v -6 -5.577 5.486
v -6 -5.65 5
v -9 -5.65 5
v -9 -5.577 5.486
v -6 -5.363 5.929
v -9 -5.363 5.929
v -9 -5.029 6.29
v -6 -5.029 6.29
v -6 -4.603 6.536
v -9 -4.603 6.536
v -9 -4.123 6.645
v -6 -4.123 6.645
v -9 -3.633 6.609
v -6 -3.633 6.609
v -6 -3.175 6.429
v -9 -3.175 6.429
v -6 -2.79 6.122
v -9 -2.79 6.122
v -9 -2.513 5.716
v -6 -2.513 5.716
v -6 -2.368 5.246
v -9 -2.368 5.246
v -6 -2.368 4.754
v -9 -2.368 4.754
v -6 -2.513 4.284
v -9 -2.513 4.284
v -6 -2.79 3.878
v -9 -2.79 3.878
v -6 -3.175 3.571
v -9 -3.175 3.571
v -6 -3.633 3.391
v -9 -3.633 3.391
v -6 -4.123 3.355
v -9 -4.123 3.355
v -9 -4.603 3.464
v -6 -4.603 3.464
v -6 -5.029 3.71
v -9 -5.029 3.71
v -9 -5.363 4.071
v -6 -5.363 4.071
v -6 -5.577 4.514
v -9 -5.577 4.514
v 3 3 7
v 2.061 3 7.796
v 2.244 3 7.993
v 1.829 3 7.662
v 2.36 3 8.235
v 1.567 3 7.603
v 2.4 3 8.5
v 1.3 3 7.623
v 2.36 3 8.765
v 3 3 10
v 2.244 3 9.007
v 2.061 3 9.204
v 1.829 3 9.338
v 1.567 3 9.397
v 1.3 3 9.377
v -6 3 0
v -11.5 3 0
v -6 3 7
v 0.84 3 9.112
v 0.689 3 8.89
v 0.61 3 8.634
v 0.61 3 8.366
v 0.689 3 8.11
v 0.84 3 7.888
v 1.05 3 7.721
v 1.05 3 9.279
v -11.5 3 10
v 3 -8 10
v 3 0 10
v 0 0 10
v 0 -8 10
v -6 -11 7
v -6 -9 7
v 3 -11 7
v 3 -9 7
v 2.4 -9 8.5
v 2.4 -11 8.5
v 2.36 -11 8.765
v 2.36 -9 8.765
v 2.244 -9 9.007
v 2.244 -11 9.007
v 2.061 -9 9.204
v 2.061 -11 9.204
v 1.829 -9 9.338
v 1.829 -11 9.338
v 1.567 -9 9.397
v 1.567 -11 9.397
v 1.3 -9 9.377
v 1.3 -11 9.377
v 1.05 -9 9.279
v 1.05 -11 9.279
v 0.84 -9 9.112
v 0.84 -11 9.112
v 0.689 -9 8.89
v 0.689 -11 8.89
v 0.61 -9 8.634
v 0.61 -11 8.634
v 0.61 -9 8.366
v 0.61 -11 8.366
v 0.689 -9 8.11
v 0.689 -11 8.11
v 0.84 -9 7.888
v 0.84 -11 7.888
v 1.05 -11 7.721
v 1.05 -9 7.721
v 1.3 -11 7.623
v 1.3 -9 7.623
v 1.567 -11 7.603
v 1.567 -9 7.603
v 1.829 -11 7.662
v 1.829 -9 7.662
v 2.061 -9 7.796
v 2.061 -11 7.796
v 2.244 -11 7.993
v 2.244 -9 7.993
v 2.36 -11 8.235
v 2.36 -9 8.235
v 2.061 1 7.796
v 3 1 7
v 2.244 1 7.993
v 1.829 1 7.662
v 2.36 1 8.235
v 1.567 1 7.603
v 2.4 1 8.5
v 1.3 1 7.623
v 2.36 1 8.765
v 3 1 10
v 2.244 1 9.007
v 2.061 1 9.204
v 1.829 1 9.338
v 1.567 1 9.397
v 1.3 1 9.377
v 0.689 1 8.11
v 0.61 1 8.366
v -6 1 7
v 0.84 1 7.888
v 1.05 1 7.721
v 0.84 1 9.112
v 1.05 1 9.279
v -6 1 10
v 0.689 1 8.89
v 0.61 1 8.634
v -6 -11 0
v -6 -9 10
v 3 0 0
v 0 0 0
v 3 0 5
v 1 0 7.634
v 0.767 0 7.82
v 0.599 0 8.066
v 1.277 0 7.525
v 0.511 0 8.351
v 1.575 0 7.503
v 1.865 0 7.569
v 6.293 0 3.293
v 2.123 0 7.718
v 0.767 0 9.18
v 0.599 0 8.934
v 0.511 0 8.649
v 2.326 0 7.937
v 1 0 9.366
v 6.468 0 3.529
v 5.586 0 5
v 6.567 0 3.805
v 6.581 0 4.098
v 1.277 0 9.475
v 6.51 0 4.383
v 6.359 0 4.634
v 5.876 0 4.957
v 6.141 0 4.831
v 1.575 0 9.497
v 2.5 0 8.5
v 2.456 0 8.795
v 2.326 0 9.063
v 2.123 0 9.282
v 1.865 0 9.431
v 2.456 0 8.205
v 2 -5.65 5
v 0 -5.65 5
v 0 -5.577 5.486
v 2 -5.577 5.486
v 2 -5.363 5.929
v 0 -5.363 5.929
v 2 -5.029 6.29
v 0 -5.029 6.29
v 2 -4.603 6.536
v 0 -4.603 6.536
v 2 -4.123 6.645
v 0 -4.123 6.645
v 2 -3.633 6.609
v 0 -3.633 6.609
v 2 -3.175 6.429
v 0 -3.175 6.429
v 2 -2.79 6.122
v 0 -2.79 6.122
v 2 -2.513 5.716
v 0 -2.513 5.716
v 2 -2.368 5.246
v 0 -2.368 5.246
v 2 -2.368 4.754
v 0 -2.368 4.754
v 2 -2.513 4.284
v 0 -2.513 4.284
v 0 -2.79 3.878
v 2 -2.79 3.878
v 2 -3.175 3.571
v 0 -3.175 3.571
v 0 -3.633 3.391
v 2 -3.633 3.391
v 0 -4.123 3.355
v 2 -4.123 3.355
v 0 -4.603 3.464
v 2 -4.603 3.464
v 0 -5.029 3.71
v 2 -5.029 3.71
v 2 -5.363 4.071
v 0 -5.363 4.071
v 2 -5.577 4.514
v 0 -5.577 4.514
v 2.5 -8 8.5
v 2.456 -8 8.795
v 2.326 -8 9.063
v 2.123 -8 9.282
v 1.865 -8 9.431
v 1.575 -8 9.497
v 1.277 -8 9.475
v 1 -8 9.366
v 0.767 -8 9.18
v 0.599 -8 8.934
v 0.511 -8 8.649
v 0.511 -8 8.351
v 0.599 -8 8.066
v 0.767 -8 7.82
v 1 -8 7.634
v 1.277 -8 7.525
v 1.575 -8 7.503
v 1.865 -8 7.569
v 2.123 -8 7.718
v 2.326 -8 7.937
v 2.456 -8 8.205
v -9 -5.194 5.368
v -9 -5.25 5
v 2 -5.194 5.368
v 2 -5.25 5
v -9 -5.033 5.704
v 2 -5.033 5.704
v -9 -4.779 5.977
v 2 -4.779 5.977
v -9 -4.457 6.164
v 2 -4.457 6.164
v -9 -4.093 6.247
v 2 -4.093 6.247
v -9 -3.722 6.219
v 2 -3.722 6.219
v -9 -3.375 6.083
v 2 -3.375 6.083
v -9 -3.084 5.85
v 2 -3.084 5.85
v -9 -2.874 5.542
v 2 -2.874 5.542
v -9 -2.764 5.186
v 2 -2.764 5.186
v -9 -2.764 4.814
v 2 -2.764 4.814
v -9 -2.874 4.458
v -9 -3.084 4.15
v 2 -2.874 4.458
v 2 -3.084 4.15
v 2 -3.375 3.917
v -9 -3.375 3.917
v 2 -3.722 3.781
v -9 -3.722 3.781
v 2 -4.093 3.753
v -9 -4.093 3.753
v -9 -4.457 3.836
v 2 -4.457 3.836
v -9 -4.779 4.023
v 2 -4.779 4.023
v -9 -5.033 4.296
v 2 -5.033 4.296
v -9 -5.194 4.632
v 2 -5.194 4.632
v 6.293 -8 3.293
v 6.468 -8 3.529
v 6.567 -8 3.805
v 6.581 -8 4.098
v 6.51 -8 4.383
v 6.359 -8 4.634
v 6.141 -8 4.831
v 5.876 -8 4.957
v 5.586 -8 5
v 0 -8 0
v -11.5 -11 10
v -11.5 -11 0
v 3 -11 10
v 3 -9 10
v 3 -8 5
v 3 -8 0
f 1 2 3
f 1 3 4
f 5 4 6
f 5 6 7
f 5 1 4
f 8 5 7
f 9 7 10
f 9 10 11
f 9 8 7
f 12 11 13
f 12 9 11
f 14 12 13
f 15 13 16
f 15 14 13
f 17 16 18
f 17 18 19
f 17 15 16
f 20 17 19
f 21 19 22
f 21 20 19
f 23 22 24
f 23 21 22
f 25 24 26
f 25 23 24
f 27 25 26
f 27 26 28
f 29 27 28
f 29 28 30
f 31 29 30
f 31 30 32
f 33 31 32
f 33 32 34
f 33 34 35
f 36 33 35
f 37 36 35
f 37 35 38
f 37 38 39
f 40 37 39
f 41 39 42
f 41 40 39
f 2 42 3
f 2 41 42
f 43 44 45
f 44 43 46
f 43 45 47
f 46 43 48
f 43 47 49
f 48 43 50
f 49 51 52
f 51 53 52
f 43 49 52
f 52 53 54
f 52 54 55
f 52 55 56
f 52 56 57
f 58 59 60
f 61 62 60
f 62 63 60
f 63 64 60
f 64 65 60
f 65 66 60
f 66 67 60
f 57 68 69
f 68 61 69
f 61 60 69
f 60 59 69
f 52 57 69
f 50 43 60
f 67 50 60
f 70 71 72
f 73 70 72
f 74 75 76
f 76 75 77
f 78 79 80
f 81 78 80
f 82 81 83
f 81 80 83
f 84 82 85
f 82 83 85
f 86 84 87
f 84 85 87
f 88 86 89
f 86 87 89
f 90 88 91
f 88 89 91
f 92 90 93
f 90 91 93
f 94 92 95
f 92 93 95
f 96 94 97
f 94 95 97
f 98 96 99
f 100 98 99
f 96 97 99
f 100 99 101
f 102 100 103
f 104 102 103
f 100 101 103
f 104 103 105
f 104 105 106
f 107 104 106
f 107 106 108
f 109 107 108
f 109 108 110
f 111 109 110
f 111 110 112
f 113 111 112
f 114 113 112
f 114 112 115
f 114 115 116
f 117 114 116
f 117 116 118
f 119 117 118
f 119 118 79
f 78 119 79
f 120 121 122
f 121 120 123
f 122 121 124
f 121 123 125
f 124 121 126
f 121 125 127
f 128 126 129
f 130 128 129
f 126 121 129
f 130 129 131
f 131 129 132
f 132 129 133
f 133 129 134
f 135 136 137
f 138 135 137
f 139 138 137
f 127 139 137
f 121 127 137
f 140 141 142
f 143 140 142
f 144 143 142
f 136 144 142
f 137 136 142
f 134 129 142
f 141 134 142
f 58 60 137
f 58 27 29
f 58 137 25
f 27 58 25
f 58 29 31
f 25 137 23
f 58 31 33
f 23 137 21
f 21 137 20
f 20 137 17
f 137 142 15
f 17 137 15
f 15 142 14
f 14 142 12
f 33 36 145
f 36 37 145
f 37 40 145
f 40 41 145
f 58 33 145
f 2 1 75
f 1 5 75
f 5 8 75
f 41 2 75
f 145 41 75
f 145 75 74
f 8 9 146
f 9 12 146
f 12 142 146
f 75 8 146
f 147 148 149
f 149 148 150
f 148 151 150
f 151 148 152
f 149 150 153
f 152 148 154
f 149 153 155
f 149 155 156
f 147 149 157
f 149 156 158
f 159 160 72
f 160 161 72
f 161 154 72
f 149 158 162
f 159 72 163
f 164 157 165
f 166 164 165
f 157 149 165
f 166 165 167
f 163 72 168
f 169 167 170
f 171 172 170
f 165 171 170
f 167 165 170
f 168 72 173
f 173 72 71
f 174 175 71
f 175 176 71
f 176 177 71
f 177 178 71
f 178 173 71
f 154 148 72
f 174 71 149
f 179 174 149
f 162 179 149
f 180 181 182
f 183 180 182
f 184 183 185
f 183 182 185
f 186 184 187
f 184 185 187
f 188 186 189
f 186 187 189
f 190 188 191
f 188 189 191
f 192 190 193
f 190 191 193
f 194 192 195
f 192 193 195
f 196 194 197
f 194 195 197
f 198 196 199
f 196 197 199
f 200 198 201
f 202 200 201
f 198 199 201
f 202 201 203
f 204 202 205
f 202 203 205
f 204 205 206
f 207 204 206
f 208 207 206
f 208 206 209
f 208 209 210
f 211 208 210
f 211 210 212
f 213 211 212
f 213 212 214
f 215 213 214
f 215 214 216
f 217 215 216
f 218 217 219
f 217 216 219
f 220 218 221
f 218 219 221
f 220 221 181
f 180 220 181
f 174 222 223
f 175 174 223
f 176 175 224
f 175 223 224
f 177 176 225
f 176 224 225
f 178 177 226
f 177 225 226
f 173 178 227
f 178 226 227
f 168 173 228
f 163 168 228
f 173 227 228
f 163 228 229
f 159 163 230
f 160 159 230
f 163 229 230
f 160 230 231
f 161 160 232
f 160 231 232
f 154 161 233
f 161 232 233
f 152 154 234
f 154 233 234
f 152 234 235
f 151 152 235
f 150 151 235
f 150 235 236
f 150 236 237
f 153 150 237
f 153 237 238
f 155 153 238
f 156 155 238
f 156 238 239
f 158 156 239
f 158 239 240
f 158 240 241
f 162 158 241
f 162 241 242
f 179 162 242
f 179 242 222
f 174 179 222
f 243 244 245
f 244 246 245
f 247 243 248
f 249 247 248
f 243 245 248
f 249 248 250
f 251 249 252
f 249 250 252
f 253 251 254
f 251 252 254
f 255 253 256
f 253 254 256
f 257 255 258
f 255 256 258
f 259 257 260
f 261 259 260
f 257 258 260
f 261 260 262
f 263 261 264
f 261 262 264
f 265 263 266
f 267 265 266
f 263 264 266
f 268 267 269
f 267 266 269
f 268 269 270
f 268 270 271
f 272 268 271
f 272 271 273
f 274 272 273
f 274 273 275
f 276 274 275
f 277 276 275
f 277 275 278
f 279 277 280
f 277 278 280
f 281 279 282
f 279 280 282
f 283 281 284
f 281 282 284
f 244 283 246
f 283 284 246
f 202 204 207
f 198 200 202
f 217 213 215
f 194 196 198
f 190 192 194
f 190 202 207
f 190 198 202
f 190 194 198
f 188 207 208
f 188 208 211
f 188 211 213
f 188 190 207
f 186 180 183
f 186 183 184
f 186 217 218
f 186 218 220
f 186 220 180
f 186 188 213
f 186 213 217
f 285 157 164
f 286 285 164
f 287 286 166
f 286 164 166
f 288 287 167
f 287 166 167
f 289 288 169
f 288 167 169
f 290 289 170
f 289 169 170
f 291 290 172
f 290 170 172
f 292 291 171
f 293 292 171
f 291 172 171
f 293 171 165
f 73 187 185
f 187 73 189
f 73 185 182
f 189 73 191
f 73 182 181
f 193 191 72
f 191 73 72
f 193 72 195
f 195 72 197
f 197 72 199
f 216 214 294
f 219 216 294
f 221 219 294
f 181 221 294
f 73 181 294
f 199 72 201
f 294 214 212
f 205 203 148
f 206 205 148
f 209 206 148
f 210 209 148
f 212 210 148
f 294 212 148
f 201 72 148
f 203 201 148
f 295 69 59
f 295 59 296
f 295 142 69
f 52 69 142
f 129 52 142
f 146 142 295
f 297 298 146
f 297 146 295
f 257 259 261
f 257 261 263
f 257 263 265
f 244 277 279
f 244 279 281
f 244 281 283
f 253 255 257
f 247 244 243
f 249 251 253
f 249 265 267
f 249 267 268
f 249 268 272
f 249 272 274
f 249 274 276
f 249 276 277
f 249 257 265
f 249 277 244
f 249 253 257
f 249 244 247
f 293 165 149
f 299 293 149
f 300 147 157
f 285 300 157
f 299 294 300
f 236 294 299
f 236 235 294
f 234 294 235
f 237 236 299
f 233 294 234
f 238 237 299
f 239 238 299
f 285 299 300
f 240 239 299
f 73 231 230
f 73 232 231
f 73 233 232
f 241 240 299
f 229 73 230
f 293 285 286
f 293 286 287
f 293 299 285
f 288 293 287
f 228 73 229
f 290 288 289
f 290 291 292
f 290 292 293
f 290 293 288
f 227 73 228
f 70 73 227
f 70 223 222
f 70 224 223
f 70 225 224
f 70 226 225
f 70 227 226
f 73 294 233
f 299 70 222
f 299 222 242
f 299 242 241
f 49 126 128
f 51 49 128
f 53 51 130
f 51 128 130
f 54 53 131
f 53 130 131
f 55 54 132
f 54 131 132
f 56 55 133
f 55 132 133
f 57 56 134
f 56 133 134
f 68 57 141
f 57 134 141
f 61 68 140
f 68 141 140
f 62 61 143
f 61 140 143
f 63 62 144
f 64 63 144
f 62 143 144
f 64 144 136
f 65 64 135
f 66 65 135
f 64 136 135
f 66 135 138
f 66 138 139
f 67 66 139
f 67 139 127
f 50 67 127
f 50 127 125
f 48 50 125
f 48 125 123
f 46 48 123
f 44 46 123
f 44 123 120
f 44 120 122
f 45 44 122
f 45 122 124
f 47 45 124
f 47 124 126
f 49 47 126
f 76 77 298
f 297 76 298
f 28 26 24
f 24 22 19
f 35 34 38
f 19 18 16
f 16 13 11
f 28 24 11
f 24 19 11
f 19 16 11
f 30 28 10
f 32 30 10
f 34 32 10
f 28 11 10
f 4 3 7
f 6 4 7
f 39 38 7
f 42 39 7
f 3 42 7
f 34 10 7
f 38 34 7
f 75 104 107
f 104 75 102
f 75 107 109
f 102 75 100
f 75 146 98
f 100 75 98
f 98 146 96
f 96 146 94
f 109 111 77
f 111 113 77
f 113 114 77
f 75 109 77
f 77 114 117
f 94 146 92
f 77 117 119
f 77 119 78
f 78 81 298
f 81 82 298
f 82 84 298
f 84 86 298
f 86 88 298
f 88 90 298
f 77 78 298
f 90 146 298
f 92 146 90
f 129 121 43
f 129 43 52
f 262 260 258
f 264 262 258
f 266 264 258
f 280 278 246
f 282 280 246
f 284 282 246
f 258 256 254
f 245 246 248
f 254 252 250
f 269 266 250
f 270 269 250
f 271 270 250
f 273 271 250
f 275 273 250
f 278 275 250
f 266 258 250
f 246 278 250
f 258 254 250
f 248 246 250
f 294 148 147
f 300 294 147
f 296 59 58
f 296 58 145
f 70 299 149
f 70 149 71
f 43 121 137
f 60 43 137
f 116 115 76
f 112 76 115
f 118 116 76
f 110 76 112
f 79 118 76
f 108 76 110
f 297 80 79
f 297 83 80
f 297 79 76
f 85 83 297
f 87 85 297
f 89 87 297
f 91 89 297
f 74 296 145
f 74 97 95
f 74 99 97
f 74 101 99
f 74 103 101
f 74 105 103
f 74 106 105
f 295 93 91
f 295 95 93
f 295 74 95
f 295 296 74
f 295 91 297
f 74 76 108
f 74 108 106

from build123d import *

# Parameters (mm, degrees)
F1_DEPTH       = 8
F2_R           = 1
F3_DEPTH       = 8.001
F4_R           = 1.65
F5_DEPTH       = 2
F6_R           = 1.25
F7_DEPTH       = 8
F8_R           = 0.9
F9_DEPTH       = 1
F9_DEPTH_BACK  = 9
F11_DEPTH      = 2
F12_W          = 13.5
F12_H          = 3
F13_DEPTH      = 2
F14_W          = 14
F14_H          = 10
F15_DEPTH      = 1
F15_DEPTH_BACK = 4.5
F17_R          = 1.65
F18_DEPTH      = 3
F20_DEPTH      = 3
F21_R          = 0.9
F22_DEPTH      = 14.001


with BuildPart() as f1:
    # F0 (on Front) → F1 (new body)
    with BuildSketch(Plane.XZ):
        with BuildLine():
            Line((0, 10), (0, 0))
            Line((0, 0), (3, 0))
            Line((3, 0), (6.2928932188, 3.2928932188))
            ThreePointArc((6.2928932188, 3.2928932188), (6.5096659701, 4.3826834324), (5.5857864376, 5))
            Line((5.5857864376, 5), (3, 5))
            Line((3, 5), (3, 10))
            Line((3, 10), (0, 10))
        make_face()
    extrude(amount=F1_DEPTH)

    # F2 (on face) → F3 (cut, through all)
    with BuildSketch(Plane.XZ.offset(8)):
        with Locations((1.5, 8.5)):
            Circle(F2_R)
    extrude(amount=-F3_DEPTH, mode=Mode.SUBTRACT)

    # F4 (on face) → F5 (cut)
    with BuildSketch(Plane(origin=(0, 0, 0), x_dir=(0, -1, 0), z_dir=(-1, 0, 0))):
        with Locations((4, 5)):
            Circle(F4_R)
    extrude(amount=-F5_DEPTH, mode=Mode.SUBTRACT)


with BuildPart() as f7:
    # F6 (on face) → F7 (new body)
    with BuildSketch(Plane(origin=(2, 0, 0), x_dir=(0, -1, 0), z_dir=(-1, 0, 0))):
        with Locations((4, 5)):
            Circle(F6_R)
    extrude(amount=F7_DEPTH)

    # F20 (add): a face of the model
    f20_faces = [f7.faces().sort_by_distance(p)[0] for p in [
        (-6, -4, 5),
    ]]
    extrude(f20_faces, amount=F20_DEPTH)


with BuildPart() as f9:
    # F8 (on face) → F9 (new body, two sides)
    with BuildSketch(Plane(origin=(0, 0, 0), x_dir=(-1, 0, 0), z_dir=(0, 1, 0))) as f9_sk:
        with Locations((-1.5, 8.5)):
            Circle(F8_R)
    extrude(amount=F9_DEPTH)
    extrude(f9_sk.sketch, amount=-F9_DEPTH_BACK)

    # F10 (on face) → F11 (join)
    with BuildSketch(Plane.XZ.offset(9)):
        Polygon((3, 10), (1.5, 10), (-10.5, 10), (-10.5, 7), (3, 7), align=None)
    extrude(amount=F11_DEPTH)

    # F12 (on face) → F13 (join)
    with BuildSketch(Plane(origin=(0, 1, 0), x_dir=(-1, 0, 0), z_dir=(0, 1, 0))):
        with Locations((3.75, 8.5)):
            Rectangle(F12_W, F12_H)
    extrude(amount=F13_DEPTH)

    # F14 (on face) → F15 (join, two sides)
    with BuildSketch(Plane(origin=(-10.5, 0, 0), x_dir=(0, -1, 0), z_dir=(-1, 0, 0))) as f15_sk:
        with Locations((4, 5)):
            Rectangle(F14_W, F14_H)
    extrude(amount=F15_DEPTH)
    extrude(f15_sk.sketch, amount=-F15_DEPTH_BACK)

    # F16: union 


with BuildPart() as f18:
    # F17 (on face) → F18 (new body)
    with BuildSketch(Plane(origin=(-6, 0, 0), x_dir=(0, -1, 0), z_dir=(-1, 0, 0))):
        with Locations((4, 5)):
            Circle(F17_R)
    extrude(amount=F18_DEPTH)


with BuildPart() as f9_1:
    add(f9.part)

    # F19: cut F18
    add(f18.part, mode=Mode.SUBTRACT)

    # F21 (on face) → F22 (cut, through all)
    with BuildSketch(Plane.XZ.offset(11)):
        with Locations((1.5, 8.5)):
            Circle(F21_R)
    extrude(amount=-F22_DEPTH, mode=Mode.SUBTRACT)


solid = Compound([f1.part, f7.part, f9_1.part])
